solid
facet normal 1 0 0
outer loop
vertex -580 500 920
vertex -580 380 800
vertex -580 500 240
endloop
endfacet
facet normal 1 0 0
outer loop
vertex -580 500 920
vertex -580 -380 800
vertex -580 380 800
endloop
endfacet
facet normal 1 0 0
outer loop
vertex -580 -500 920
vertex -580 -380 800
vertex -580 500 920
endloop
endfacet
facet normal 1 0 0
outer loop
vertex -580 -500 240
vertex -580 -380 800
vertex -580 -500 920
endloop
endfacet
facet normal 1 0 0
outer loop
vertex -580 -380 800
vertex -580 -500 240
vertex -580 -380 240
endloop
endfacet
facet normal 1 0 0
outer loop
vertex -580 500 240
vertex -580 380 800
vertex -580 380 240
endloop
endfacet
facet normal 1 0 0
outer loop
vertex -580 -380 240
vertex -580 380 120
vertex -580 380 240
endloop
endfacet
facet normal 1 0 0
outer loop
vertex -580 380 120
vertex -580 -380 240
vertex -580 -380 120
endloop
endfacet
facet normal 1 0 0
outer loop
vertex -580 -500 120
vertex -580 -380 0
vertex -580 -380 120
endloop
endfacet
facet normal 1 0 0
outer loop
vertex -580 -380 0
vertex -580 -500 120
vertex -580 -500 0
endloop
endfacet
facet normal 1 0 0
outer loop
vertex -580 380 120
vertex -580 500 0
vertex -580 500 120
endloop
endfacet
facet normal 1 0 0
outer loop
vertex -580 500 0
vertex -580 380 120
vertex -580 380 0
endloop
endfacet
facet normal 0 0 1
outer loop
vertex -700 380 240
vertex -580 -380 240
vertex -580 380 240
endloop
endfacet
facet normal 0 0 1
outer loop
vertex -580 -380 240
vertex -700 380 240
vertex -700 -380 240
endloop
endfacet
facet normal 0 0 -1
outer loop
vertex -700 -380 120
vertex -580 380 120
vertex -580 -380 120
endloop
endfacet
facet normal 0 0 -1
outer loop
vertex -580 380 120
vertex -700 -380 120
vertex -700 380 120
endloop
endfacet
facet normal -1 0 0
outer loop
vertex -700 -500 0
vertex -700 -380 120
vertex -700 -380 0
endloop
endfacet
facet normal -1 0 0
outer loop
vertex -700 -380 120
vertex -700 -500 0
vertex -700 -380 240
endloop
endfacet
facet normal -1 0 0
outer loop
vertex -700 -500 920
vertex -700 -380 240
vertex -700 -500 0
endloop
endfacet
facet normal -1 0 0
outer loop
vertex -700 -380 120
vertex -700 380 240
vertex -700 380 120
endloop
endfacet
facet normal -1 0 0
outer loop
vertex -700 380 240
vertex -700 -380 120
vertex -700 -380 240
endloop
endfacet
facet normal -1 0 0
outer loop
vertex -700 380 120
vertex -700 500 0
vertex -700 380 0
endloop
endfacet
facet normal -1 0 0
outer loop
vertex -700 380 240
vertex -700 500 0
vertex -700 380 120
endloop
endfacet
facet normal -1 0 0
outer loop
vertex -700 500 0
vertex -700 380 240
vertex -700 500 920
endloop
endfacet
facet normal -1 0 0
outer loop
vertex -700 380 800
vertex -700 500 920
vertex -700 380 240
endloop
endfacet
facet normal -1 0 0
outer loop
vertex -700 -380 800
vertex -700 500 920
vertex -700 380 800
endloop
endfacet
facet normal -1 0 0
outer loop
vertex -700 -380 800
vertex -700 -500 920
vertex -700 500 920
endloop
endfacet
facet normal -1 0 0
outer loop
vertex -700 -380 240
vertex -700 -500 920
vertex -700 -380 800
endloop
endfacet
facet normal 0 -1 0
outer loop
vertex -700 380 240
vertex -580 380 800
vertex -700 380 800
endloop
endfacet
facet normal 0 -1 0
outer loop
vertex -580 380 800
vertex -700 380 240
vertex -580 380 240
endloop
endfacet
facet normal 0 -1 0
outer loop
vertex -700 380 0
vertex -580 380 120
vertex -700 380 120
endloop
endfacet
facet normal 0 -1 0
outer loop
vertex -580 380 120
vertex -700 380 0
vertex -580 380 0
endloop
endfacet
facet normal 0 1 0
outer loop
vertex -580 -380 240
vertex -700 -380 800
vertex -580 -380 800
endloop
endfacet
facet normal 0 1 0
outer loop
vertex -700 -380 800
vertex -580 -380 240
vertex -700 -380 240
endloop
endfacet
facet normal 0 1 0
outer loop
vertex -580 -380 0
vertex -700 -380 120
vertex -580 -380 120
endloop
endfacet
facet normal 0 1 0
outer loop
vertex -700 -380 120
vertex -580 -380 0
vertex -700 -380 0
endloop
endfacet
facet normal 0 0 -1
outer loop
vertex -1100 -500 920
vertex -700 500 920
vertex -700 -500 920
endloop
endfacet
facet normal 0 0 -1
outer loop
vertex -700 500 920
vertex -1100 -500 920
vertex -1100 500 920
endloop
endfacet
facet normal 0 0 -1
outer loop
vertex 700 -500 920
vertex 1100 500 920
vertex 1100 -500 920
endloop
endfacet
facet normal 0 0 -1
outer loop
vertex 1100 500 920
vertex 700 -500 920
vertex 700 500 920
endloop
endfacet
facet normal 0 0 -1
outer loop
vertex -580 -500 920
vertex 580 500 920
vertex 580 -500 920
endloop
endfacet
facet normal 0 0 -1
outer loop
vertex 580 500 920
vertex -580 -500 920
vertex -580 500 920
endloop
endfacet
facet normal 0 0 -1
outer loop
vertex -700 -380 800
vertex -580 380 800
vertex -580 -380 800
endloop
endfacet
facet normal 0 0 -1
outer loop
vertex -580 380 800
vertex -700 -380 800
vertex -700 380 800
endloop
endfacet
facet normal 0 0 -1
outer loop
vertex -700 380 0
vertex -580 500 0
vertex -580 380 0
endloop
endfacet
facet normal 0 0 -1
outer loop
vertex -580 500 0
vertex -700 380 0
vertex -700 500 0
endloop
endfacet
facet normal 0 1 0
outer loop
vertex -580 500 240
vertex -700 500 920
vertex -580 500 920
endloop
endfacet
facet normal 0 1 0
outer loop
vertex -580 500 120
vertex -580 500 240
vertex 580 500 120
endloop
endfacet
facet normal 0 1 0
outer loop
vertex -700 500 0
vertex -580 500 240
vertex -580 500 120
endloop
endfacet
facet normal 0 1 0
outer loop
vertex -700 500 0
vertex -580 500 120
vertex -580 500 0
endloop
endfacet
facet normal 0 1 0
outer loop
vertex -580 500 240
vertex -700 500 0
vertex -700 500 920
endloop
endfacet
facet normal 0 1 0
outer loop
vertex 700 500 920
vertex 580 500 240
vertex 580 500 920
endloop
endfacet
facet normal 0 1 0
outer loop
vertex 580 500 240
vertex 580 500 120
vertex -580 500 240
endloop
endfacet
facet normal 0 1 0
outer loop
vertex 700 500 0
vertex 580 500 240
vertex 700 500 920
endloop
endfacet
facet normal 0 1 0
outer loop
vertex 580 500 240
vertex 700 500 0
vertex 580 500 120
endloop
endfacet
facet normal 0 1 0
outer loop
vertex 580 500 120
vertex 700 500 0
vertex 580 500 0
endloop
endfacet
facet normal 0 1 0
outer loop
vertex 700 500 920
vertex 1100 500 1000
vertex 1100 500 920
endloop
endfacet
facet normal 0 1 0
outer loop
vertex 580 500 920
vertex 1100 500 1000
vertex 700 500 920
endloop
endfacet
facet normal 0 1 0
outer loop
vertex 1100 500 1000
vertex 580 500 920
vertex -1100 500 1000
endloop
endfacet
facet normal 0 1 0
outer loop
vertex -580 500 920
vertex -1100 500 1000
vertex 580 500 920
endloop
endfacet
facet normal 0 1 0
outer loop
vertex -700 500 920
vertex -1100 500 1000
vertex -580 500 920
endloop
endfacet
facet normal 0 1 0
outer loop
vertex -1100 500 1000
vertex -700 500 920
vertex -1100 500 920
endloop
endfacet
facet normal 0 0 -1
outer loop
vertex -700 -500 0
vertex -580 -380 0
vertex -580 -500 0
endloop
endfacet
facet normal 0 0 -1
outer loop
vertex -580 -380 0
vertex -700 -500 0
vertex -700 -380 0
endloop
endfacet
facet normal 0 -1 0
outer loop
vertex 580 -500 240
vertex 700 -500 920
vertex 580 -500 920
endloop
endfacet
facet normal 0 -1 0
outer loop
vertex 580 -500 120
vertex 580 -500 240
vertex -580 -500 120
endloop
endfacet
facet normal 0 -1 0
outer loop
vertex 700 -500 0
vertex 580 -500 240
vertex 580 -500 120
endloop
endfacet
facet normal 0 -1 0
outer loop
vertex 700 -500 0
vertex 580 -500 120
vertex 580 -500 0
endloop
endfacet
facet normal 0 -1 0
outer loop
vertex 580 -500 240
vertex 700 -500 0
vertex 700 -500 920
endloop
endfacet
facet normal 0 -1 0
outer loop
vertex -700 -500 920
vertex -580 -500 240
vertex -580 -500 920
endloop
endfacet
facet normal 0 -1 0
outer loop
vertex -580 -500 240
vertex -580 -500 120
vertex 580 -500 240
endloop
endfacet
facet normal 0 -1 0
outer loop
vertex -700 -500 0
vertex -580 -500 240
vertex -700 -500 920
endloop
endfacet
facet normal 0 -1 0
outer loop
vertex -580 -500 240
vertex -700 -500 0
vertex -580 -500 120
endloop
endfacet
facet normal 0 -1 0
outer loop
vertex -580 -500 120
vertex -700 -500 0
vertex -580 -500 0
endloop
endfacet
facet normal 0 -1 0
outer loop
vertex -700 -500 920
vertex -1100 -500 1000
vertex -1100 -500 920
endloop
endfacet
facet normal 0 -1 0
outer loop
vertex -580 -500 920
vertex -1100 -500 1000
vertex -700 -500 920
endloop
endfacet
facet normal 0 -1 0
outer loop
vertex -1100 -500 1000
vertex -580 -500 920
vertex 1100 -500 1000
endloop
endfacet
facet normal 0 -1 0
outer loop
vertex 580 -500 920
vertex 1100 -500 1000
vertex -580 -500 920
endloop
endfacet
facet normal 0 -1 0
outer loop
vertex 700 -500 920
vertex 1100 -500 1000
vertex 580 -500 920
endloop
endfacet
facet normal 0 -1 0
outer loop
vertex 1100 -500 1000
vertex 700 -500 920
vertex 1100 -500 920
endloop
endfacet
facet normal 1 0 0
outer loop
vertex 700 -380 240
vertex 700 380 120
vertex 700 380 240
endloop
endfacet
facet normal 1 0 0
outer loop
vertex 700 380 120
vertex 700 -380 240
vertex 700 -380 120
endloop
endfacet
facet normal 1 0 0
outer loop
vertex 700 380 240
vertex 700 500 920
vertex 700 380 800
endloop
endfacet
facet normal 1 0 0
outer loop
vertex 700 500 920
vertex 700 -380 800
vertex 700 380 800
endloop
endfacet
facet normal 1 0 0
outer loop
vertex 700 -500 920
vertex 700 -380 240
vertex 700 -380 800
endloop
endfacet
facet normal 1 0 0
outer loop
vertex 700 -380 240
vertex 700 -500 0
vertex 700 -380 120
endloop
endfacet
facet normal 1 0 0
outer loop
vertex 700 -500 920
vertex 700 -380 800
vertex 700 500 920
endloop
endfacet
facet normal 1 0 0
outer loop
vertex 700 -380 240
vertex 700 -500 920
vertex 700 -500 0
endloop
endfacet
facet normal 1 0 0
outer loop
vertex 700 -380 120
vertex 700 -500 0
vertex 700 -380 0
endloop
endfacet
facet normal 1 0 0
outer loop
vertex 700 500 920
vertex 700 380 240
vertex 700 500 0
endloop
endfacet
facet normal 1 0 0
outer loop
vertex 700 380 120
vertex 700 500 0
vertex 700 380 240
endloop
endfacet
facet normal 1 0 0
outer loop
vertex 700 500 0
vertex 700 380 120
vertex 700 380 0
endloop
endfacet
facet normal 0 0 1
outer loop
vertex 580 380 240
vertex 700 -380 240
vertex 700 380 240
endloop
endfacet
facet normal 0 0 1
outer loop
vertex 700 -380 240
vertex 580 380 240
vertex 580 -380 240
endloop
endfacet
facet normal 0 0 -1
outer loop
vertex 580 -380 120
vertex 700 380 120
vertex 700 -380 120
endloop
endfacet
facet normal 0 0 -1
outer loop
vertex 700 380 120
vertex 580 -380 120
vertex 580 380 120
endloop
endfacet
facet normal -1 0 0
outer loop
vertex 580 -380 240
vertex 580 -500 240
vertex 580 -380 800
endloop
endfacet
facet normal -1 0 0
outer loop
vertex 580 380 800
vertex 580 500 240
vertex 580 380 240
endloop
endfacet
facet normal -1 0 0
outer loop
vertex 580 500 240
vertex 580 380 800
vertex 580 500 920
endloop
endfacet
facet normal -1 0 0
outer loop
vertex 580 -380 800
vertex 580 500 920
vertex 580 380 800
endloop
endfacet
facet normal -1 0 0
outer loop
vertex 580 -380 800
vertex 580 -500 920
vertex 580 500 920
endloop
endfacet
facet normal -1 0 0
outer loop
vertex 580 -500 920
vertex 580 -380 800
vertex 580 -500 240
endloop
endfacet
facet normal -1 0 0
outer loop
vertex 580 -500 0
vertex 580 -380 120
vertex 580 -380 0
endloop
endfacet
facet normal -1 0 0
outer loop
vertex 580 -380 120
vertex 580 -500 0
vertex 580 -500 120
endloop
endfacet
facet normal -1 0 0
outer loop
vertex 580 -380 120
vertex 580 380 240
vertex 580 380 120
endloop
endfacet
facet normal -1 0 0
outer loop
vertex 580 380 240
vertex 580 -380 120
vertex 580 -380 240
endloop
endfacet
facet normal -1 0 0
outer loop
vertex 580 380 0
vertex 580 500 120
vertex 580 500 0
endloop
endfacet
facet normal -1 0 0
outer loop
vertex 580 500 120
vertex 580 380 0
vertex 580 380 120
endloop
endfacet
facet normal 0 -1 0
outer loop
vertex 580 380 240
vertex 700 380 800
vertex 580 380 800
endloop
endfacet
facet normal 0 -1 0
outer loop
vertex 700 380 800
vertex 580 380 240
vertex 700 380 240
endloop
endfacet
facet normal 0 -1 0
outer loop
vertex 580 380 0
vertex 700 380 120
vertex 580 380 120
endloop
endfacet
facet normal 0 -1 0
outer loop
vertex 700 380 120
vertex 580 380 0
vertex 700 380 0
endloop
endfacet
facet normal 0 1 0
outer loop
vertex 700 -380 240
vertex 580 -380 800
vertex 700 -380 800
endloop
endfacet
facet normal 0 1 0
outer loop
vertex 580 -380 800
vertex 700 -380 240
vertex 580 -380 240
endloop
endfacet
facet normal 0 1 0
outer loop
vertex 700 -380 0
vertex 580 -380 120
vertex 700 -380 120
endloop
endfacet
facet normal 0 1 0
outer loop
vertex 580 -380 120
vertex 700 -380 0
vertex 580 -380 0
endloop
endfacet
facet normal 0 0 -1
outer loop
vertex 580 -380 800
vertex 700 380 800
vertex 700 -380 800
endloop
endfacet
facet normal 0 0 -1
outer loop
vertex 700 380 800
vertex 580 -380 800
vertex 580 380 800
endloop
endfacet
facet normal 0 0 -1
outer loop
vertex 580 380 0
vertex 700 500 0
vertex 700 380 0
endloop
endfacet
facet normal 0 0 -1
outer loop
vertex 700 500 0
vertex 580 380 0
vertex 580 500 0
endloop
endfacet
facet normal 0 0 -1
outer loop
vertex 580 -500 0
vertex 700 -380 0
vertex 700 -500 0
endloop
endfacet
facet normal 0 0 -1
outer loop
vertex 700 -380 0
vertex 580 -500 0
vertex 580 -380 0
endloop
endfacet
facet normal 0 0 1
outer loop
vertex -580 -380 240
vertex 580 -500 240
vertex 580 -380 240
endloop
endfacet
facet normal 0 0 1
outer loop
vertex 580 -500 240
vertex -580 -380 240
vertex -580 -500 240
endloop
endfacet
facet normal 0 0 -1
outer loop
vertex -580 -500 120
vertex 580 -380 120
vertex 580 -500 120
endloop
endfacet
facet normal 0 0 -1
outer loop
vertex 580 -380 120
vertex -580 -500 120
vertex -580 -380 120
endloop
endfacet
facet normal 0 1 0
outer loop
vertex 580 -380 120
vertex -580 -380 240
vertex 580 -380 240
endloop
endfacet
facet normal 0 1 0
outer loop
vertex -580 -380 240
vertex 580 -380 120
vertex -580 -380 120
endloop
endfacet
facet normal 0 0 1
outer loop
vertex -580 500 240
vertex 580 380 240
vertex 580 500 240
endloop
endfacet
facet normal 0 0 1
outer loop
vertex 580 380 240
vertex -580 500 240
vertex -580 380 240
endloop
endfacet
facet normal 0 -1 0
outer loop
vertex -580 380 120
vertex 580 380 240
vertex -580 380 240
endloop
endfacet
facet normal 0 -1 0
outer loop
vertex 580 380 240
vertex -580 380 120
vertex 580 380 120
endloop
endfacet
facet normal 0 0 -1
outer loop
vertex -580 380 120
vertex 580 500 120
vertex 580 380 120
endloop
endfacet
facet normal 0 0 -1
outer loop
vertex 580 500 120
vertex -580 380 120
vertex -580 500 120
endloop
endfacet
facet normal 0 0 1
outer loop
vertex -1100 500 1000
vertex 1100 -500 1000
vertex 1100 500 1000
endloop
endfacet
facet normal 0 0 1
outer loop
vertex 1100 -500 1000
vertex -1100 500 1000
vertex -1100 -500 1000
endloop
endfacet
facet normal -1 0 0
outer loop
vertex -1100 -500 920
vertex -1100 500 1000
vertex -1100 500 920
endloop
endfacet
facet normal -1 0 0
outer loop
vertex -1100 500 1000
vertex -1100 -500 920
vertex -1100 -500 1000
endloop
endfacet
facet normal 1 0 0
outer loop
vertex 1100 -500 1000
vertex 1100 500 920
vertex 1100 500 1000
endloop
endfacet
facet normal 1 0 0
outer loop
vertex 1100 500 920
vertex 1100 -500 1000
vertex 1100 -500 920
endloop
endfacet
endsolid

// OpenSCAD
module workbench(width = 1000, length = 1500, height = 1000, deskThickness = 80, legThickness = 80, overstandDesk = 50) {

    legInnerWidth = width - legThickness * 2;
    legInnerLength = length - overstandDesk * 2 - legThickness * 2;
    legInnerHeight = height - deskThickness;

    module desk() {
        rotate([0, 0, 90]) translate([0, 0, deskThickness/2 + height - deskThickness]) cube(size = [width, length, deskThickness], center = true);
    }

    module legBase() {
        translate([-legInnerLength/2 - legThickness/2, 0, 0]) {
            leg();
            translate([legInnerLength+legThickness, 0, 0]) leg();
            
            // bottom right cross beam lenth
            rotate([0, 0, 90]) translate([-(legInnerWidth/2 + legThickness/2), -(legInnerLength/2 + legThickness/2), legThickness + legThickness/2]) cube(size=[legThickness, legInnerLength, legThickness], center = true);
            rotate([0, 0, 90]) translate([+(legInnerWidth/2 + legThickness/2), -(legInnerLength/2 + legThickness/2), legThickness + legThickness/2]) cube(size=[legThickness, legInnerLength, legThickness], center = true);
        }
    }

    module leg() {
        // bottom cross beam width
        translate([0, 0, legThickness + legThickness/2]) cube(size=[legThickness, legInnerWidth, legThickness], center = true);
        // top cross beam width
        translate([0, 0, legInnerHeight - legThickness/2]) cube(size=[legThickness, legInnerWidth, legThickness], center = true);

        // left leg
        translate([0, legInnerWidth/2 + legThickness/2, legInnerHeight/2]) cube(size=[legThickness, legThickness, legInnerHeight], center = true);
        // right leg
        translate([0, -(legInnerWidth/2 + legThickness/2), legInnerHeight/2]) cube(size=[legThickness, legThickness, legInnerHeight], center = true);
    }

    module partsList() {
        // desk
        echo(str("Tischplatte", " ", "1", " ", length, " ", width, " ", deskThickness));
        // legs
        echo(str("Beine", " ", "4", " ", legInnerHeight, " ", legThickness, " ", legThickness));
        // leg cross bars
        echo(str("Beine Querstreben", " ", "4", " ", legInnerWidth, " ", legThickness, " ", legThickness));
        // leg cross bars length
        echo(str("Beine Längsstreben", " ", "2", " ", legInnerLength, " ", legThickness, " ", legThickness));
    }

    legBase();
    desk();

    partsList();
}

//scaleFactor = 10;
//scale([1 / scaleFactor, 1 / scaleFactor, 1 / scaleFactor]) {
    // translate for printing
    //translate([0,0,1000])
    // rotate for printing
    //rotate([0, 180, 0])
    // workbench(
    //     width = 1000,
    //     length = 1800,
    //     height = 1000,
    //     deskThickness = 80,
    //     legThickness = 80,
    //     overstandDesk = 200
    // );
//}


workbench(
    width = 1000,
    length = 2200,
    height = 1000,
    deskThickness = 80,
    legThickness = 120,
    overstandDesk = 400
);
